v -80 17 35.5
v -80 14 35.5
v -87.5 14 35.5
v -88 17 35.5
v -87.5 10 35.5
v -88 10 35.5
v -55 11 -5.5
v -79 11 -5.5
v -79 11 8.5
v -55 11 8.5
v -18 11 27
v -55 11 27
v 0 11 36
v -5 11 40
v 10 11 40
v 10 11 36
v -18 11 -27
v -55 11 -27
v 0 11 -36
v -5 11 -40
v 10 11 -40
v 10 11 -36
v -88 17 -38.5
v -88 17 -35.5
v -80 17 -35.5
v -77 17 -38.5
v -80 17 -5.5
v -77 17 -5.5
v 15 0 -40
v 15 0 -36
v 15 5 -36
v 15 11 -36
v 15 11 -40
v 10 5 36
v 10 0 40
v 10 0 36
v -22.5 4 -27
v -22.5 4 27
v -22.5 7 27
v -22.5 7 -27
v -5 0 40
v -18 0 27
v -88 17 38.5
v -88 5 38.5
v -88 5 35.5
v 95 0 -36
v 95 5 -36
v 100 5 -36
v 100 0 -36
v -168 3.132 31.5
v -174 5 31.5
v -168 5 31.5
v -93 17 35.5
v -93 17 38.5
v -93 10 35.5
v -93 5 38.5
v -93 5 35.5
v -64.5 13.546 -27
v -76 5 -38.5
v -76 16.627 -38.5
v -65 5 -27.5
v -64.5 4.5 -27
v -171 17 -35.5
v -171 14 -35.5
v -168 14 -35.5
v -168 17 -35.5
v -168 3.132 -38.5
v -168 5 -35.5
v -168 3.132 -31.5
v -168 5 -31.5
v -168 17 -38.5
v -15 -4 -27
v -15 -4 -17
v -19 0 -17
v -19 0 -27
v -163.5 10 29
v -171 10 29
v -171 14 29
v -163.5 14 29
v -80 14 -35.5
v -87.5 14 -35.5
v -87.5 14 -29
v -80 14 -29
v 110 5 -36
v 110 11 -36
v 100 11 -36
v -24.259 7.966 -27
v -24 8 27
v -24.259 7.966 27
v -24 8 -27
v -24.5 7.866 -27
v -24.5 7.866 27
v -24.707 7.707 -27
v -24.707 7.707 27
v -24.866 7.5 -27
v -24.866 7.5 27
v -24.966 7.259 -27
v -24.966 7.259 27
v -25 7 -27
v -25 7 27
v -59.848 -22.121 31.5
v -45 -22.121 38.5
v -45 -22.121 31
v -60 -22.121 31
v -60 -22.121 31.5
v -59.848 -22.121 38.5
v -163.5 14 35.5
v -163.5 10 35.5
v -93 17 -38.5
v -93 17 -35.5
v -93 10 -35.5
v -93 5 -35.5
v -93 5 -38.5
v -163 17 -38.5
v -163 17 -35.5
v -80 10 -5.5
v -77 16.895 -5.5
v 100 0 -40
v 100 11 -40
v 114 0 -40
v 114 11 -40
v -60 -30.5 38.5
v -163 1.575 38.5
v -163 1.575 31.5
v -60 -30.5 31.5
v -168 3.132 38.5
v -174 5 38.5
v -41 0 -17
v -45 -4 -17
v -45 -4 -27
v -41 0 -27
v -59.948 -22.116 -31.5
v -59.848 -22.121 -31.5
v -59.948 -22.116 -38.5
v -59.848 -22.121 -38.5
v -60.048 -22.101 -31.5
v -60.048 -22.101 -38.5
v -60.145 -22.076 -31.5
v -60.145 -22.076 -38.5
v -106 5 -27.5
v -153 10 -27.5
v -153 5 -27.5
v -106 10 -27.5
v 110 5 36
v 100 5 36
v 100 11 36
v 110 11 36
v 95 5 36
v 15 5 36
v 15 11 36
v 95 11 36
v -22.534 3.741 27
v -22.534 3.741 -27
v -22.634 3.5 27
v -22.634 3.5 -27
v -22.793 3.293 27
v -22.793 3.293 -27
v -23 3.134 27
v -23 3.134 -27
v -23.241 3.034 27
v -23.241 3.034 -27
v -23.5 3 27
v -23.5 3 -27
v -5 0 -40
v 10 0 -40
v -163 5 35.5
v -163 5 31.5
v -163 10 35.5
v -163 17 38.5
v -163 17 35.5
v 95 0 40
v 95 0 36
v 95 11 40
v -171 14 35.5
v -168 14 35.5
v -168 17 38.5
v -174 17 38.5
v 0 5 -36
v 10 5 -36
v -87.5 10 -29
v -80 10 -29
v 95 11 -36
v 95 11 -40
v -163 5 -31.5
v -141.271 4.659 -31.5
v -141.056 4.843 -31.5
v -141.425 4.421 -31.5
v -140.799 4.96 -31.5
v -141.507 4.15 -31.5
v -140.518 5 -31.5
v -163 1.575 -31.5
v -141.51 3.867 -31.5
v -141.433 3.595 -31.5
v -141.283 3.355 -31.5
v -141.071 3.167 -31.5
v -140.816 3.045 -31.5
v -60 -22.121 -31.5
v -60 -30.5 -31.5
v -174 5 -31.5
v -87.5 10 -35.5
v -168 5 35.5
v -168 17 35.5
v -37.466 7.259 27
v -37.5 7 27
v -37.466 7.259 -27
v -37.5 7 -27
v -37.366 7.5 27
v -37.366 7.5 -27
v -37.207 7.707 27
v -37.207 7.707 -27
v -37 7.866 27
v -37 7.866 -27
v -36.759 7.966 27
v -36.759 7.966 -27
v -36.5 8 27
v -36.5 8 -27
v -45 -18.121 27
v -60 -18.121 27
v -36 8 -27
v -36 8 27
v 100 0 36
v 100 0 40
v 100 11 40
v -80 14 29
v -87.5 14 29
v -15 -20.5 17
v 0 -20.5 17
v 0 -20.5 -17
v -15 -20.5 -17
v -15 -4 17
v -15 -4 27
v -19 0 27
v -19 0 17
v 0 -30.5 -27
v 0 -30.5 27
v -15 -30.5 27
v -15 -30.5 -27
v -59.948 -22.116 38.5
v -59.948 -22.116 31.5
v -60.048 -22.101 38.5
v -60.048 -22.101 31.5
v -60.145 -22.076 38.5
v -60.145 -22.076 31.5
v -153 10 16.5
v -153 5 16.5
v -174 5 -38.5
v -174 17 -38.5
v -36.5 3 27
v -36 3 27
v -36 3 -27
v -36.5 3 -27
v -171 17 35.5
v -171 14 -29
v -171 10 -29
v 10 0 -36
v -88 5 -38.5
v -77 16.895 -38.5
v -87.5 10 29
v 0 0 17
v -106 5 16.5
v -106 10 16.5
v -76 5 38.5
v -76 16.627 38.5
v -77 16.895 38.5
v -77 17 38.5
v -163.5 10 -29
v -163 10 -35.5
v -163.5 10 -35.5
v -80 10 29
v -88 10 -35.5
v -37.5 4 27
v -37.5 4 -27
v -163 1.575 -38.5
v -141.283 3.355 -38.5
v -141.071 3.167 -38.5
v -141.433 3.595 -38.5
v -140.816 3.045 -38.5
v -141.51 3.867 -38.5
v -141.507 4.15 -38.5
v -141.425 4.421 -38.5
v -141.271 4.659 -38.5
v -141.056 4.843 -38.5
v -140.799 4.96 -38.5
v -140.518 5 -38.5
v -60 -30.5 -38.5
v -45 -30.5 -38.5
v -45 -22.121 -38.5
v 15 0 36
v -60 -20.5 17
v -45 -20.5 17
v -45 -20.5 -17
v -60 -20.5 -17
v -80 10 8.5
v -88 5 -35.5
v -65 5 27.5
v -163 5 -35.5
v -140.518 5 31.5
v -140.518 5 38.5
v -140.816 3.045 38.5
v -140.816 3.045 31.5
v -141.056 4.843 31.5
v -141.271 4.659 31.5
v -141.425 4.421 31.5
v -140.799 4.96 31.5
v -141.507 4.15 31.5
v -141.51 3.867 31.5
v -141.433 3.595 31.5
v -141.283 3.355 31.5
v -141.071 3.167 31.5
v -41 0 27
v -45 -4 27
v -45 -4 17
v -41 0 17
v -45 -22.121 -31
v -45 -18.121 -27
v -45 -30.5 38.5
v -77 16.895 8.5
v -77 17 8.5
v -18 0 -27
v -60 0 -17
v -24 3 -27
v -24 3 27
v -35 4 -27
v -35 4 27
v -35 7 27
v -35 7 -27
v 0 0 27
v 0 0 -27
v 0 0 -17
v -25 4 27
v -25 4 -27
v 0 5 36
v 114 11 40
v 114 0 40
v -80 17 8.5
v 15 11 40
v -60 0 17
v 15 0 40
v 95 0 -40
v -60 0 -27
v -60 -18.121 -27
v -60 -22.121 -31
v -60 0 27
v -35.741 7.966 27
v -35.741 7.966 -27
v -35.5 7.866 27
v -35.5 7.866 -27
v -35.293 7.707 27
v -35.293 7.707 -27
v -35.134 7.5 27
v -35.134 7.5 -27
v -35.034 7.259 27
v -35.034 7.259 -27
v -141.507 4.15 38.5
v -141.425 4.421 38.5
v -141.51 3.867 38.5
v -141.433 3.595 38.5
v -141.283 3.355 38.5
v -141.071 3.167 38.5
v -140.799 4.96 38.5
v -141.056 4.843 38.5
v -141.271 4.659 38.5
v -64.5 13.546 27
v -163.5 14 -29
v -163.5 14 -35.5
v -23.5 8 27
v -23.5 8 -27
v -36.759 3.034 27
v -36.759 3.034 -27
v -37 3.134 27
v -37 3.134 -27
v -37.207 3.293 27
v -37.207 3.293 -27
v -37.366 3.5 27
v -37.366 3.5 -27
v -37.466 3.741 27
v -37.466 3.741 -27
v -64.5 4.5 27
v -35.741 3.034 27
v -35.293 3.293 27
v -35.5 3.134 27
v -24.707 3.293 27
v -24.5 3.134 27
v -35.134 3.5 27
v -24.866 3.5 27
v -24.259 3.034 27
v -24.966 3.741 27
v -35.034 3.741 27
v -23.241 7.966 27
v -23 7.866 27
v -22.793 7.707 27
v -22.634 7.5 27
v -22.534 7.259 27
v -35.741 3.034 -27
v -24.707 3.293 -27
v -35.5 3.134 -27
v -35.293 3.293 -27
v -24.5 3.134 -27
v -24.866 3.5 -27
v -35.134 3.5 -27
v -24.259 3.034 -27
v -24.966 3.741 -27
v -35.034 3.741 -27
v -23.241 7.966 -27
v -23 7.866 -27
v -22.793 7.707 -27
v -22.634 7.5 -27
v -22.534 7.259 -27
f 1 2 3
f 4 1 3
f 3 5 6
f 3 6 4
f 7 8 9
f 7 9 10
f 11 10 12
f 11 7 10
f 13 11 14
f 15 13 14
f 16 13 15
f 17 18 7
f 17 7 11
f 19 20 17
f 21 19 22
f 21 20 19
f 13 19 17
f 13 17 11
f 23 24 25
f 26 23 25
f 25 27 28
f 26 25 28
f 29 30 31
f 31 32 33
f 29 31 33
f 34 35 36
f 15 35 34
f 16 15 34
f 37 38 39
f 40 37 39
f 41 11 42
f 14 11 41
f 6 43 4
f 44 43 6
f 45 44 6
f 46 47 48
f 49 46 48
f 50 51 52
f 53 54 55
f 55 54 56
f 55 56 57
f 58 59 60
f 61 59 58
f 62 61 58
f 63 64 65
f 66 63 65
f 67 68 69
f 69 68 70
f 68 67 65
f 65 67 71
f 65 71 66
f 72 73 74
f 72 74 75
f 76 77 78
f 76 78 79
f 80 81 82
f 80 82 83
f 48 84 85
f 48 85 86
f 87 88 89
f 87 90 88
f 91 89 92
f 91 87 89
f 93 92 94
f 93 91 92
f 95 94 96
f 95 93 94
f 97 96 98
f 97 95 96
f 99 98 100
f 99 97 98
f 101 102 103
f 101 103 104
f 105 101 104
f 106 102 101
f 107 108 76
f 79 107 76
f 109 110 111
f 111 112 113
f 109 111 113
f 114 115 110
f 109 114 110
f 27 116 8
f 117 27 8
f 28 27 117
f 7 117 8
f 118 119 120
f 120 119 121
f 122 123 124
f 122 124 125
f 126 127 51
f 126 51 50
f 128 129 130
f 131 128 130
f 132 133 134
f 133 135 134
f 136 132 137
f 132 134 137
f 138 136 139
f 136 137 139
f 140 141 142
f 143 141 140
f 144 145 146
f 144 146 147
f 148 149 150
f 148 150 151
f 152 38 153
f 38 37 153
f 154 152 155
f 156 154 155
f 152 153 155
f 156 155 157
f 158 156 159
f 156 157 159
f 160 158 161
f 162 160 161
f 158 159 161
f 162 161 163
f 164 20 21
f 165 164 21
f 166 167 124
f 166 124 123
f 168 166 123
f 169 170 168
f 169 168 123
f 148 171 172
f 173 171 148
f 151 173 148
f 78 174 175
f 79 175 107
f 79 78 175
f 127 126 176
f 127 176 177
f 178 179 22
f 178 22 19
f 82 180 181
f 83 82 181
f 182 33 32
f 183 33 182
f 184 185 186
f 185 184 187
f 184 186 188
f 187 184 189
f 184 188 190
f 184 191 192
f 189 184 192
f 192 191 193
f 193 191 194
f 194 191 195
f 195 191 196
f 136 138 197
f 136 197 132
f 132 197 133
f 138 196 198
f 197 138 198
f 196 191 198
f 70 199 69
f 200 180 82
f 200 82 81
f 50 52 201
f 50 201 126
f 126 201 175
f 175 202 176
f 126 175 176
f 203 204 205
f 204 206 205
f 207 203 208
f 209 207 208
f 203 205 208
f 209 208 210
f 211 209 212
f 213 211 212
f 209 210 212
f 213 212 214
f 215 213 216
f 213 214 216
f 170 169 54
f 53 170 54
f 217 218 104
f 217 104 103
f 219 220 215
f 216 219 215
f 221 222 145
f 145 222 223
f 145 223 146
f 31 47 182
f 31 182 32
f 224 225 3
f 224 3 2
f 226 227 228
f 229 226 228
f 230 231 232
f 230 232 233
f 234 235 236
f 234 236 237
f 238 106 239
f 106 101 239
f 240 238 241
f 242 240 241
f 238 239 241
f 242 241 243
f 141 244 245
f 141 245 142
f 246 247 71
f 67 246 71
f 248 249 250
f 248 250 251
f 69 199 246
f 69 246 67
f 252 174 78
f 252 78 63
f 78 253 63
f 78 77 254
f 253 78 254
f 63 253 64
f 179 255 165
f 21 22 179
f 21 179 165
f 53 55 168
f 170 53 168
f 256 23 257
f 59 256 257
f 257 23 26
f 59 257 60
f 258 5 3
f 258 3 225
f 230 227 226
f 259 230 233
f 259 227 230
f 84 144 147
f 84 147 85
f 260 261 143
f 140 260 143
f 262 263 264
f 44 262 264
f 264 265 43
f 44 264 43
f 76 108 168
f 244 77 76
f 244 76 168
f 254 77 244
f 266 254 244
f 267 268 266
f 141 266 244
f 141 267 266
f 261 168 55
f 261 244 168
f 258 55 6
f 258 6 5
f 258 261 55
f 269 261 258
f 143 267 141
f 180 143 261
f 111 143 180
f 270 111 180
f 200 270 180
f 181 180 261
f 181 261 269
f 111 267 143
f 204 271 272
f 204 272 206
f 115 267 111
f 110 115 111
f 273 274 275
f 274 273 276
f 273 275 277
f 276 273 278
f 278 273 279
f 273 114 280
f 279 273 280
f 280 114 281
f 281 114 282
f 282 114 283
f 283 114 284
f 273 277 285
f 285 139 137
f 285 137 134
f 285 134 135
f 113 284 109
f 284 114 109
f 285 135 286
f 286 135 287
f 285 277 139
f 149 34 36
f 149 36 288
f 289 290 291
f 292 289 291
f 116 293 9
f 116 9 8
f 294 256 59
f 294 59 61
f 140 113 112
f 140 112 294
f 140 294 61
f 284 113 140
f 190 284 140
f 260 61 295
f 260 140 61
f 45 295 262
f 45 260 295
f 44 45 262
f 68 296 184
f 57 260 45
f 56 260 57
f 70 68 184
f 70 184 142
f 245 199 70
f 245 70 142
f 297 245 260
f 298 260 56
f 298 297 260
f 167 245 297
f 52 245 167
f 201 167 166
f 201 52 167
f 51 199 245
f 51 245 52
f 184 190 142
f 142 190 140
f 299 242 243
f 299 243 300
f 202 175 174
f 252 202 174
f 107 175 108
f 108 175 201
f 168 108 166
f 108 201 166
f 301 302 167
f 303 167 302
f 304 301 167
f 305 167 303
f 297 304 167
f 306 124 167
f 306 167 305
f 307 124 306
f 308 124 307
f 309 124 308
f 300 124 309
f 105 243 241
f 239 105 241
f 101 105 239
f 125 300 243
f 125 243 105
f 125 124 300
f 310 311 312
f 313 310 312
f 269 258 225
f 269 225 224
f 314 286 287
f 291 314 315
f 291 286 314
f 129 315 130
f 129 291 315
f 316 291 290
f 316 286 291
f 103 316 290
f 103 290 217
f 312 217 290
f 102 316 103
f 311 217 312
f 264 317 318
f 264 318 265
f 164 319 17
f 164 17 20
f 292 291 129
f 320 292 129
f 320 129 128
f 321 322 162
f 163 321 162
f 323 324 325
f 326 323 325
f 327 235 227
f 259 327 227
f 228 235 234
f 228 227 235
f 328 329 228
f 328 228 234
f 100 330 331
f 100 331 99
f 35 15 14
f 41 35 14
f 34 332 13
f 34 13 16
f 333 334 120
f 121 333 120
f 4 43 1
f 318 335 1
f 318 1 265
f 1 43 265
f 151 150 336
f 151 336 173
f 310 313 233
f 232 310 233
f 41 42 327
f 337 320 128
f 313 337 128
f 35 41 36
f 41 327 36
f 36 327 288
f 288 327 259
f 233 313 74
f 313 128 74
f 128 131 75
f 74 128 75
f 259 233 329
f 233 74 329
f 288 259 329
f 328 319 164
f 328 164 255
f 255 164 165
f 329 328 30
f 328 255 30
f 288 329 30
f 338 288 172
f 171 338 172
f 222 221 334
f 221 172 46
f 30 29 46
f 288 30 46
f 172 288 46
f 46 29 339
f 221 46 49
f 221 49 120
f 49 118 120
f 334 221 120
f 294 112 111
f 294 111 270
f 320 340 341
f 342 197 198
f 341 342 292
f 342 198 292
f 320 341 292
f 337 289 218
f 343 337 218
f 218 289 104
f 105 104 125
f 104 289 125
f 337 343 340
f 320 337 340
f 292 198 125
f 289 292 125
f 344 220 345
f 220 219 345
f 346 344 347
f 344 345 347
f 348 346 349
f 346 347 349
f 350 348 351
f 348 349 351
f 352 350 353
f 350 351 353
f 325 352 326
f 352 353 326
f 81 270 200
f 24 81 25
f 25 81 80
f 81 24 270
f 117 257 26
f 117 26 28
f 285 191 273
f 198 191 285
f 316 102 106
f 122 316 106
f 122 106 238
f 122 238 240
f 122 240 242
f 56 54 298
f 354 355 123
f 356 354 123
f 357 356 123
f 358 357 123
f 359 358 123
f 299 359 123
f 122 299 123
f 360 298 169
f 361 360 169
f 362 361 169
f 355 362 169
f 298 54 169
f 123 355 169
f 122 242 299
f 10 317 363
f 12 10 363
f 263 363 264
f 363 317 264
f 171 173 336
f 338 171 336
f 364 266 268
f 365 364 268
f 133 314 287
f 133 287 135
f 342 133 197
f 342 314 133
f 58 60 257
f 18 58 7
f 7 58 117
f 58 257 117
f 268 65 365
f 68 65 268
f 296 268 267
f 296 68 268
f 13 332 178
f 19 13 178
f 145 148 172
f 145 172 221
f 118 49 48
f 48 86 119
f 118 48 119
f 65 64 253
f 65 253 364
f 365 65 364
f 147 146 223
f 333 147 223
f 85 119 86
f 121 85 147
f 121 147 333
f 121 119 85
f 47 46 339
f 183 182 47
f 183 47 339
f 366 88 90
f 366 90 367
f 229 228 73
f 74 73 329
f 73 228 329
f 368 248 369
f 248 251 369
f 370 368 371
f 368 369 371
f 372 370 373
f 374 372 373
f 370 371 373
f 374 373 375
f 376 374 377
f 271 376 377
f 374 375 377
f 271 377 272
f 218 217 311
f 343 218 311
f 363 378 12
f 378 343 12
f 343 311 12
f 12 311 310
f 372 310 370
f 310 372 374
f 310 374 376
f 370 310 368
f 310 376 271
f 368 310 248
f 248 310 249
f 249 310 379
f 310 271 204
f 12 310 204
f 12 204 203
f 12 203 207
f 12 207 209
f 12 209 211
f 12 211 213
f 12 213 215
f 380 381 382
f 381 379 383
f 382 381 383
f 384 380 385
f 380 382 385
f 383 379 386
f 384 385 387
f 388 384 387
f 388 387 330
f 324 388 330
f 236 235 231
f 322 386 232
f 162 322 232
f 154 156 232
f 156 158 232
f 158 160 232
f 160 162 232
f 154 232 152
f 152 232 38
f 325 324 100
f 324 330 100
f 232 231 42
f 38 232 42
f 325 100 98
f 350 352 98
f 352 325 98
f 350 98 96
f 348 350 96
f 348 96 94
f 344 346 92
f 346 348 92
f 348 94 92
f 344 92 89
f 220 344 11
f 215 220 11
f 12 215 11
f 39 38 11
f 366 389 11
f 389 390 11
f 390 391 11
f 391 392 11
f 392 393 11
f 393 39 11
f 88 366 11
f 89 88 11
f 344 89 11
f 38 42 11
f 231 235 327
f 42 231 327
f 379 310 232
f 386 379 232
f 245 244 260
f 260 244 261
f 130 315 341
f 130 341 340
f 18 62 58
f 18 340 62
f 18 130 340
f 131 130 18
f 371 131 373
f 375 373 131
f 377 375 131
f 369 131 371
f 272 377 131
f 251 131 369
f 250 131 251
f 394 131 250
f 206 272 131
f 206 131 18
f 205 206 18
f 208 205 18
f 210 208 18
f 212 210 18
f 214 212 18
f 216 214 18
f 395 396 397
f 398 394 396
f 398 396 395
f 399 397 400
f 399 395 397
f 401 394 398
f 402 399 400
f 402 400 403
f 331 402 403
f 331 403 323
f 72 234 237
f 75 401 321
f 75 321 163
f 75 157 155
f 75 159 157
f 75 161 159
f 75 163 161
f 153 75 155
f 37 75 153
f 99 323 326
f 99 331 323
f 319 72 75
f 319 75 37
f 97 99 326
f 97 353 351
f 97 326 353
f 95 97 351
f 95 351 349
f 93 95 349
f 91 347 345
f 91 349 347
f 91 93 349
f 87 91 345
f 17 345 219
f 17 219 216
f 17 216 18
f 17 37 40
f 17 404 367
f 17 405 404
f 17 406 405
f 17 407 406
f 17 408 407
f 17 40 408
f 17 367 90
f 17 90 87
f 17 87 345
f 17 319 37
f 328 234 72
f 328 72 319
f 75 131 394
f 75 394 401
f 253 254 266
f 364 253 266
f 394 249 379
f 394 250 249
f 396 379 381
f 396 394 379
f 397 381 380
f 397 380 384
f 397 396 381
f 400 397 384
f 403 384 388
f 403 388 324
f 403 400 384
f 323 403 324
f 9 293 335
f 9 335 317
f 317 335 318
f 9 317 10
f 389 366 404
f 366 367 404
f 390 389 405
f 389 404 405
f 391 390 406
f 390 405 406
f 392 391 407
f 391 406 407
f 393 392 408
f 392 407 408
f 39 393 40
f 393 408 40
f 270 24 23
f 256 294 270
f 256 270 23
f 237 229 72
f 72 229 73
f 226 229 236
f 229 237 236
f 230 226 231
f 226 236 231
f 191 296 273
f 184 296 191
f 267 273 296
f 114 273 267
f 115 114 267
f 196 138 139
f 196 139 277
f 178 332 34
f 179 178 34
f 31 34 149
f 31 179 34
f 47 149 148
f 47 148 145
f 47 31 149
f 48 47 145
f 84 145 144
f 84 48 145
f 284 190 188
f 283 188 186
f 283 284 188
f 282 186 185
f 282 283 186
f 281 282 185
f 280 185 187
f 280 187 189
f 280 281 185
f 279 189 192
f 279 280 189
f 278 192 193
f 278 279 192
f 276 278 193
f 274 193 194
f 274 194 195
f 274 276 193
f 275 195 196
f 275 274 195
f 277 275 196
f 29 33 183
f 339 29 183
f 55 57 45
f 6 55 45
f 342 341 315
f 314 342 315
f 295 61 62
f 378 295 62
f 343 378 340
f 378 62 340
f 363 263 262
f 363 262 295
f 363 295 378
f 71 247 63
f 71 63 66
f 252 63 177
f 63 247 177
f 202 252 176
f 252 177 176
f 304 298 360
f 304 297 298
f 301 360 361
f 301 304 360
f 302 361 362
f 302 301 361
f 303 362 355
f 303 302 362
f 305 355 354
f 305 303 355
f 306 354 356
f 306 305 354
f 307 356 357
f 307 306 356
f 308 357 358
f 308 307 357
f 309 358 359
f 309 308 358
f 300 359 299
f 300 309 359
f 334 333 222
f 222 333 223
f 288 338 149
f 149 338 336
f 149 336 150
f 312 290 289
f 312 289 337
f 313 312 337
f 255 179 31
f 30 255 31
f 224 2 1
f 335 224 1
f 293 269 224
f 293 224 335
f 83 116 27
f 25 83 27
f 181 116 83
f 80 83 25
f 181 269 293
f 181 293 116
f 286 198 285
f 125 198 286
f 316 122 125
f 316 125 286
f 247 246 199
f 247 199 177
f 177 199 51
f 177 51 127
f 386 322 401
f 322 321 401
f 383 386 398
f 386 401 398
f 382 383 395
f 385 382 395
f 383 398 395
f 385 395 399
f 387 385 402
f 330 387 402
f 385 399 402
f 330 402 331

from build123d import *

# Parameters (mm, degrees)
SKETCH2_W            = 54
SKETCH2_H            = 41.5
SKETCH2_W_2          = 34
SKETCH2_H_2          = 20.5
BOSS_EXTRUDE1_DEPTH  = 80
CUT_EXTRUDE2_REACH   = 103.224
SKETCH4_W            = 30
SKETCH4_H            = 30.5
SKETCH4_W_2          = 20
SKETCH7_W            = 91
SKETCH7_H            = 71
BOSS_EXTRUDE2_DEPTH  = 5
SKETCH8_W            = 47
SKETCH8_H            = 44
CUT_EXTRUDE3_DEPTH   = 6
SKETCH10_W           = 97
SKETCH10_H           = 77
BOSS_EXTRUDE3_DEPTH  = 12
SKETCH11_W           = 7.5
SKETCH11_H           = 6.5
BOSS_EXTRUDE4_DEPTH  = 4
SKETCH12_W           = 3
SKETCH12_H           = 14
CUT_EXTRUDE5_DEPTH   = 6
SKETCH13_W           = 2.5
SKETCH13_H           = 5
CUT_EXTRUDE6_DEPTH   = 54
BOSS_EXTRUDE5_REACH  = 194.705
CUT_EXTRUDE8_REACH   = 186.43
SKETCH18_W           = 114
SKETCH18_H           = 63
CHAMFER2_SIZE        = 5
FILLET1_R            = 1
CHAMFER3_SIZE        = 4
CHAMFER4_SIZE        = 12.5
FILLET2_R            = 1
CHAMFER5_SIZE        = 1
FILLET2_OF_MIRROR1_R = 1
BOSS_EXTRUDE6_START  = -5
SKETCH19_W           = 110
SKETCH19_H           = 72
BOSS_EXTRUDE6_DEPTH  = 5
BOSS_EXTRUDE7_START  = -5
SKETCH21_W           = 118
SKETCH21_H           = 80
BOSS_EXTRUDE7_DEPTH  = 11
CHAMFER7_SIZE        = 14
CUT_EXTRUDE9_REACH   = 185.298
SKETCH22_W           = 5
SKETCH22_H           = 4
CUT_EXTRUDE10_START  = -12
SKETCH23_W           = 5
SKETCH23_H           = 3
CUT_EXTRUDE10_DEPTH  = 12
CUT_EXTRUDE11_REACH  = 184.034
SKETCH24_W           = 5
SKETCH24_H           = 77
CHAMFER8_SIZE        = 22
CHAMFER8_SIZE2       = 5.894882233


# Some blends are built 0.0001 mm under size
with BuildPart() as part:
    # Sketch2 → Boss-Extrude1 (new body)
    with BuildSketch(Plane(origin=(0, 0, 0), x_dir=(0, 0, -1), z_dir=(1, 0, 0))):
        with Locations((0, -9.75)):
            Rectangle(SKETCH2_W, SKETCH2_H)
        with Locations((0, -10.25)):
            Rectangle(SKETCH2_W_2, SKETCH2_H_2, mode=Mode.SUBTRACT)
    extrude(amount=-BOSS_EXTRUDE1_DEPTH)

    # Cut-Extrude2: up to this face of the body (flat: up to its plane)
    cut_extrude2_end = Plane(part.part.faces().sort_by_distance((-40, -9.75, -27))[0])
    # Sketch4 → Cut-Extrude2 (cut, up to the picked face)
    with BuildSketch(Plane.XY.offset(27), mode=Mode.PRIVATE) as cut_extrude2_sk1:
        with Locations((-30, -15.25)):
            Rectangle(SKETCH4_W, SKETCH4_H)
    cut_extrude2_tool1 = split(extrude(cut_extrude2_sk1.sketch, amount=-CUT_EXTRUDE2_REACH, mode=Mode.PRIVATE), bisect_by=cut_extrude2_end, keep=Keep.BOTH, mode=Mode.PRIVATE)
    # Sketch4 → Cut-Extrude2 (cut, up to the picked face)
    with BuildSketch(Plane.XY.offset(27), mode=Mode.PRIVATE) as cut_extrude2_sk2:
        with Locations((-70, -15.25)):
            Rectangle(SKETCH4_W_2, SKETCH4_H)
    cut_extrude2_tool2 = split(extrude(cut_extrude2_sk2.sketch, amount=-CUT_EXTRUDE2_REACH, mode=Mode.PRIVATE), bisect_by=cut_extrude2_end, keep=Keep.BOTH, mode=Mode.PRIVATE)
    add(cut_extrude2_tool1.solids().sort_by(Axis((-30, -15.25, 27), (0, 0, -1)))[0], mode=Mode.SUBTRACT)
    add(cut_extrude2_tool2.solids().sort_by(Axis((-70, -15.25, 27), (0, 0, -1)))[0], mode=Mode.SUBTRACT)

    # Sketch7 → Boss-Extrude2 (add)
    with BuildSketch(Plane(origin=(0, 5, 0), x_dir=(1, 0, 0), z_dir=(0, 1, 0))):
        with Locations((-125.5, 0)):
            Rectangle(SKETCH7_W, SKETCH7_H)
    extrude(amount=BOSS_EXTRUDE2_DEPTH)

    # Sketch8 → Cut-Extrude3 (cut)
    with BuildSketch(Plane(origin=(0, 11, 0), x_dir=(1, 0, 0), z_dir=(0, 1, 0))):
        with Locations((-129.5, 5.5)):
            Rectangle(SKETCH8_W, SKETCH8_H)
    extrude(amount=-CUT_EXTRUDE3_DEPTH, mode=Mode.SUBTRACT)

    # Sketch10 → Boss-Extrude3 (add)
    with BuildSketch(Plane.XZ.offset(-5)):
        with Locations((-125.5, 0)):
            Rectangle(SKETCH10_W, SKETCH10_H)
        Polygon((-80, 27), (-80, 35.5), (-171, 35.5), (-171, -35.5), (-80, -35.5), (-80, -27), align=None, mode=Mode.SUBTRACT)
    extrude(amount=-BOSS_EXTRUDE3_DEPTH)

    # Sketch11 → Boss-Extrude4 (add)
    with BuildSketch(Plane(origin=(0, 10, 0), x_dir=(1, 0, 0), z_dir=(0, 1, 0))):
        with Locations((-167.25, -32.25)):
            Rectangle(SKETCH11_W, SKETCH11_H)
        with Locations((-83.75, -32.25)):
            Rectangle(SKETCH11_W, SKETCH11_H)
        with Locations((-83.75, 32.25)):
            Rectangle(SKETCH11_W, SKETCH11_H)
        with Locations((-167.25, 32.25)):
            Rectangle(SKETCH11_W, SKETCH11_H)
    extrude(amount=BOSS_EXTRUDE4_DEPTH)

    # Sketch12 → Cut-Extrude5 (cut)
    with BuildSketch(Plane(origin=(0, 17, 0), x_dir=(1, 0, 0), z_dir=(0, 1, 0))):
        with Locations((-78.5, -1.5)):
            Rectangle(SKETCH12_W, SKETCH12_H)
    extrude(amount=-CUT_EXTRUDE5_DEPTH, mode=Mode.SUBTRACT)

    # Sketch13 → Cut-Extrude6 (cut)
    with BuildSketch(Plane.XY.offset(27)):
        with Locations((-23.75, 5.5)):
            Rectangle(SKETCH13_W, SKETCH13_H)
    cut_extrude6 = extrude(amount=-CUT_EXTRUDE6_DEPTH, mode=Mode.SUBTRACT)

    # Boss-Extrude5: up to this face of the body (flat: up to its plane)
    boss_extrude5_end = Plane(part.part.faces().sort_by_distance((-125.5, 11, -38.5))[0])
    # Sketch15 → Boss-Extrude5 (add, up to the picked face)
    with BuildSketch(Plane.XY.offset(38.5), mode=Mode.PRIVATE) as boss_extrude5_sk1:
        Polygon((-174, 5), (-60, -30.5), (-45, -30.5), (-45, -22.121084957), (-60, -22.121084957), (-147.093061552, 5), align=None)
    boss_extrude5_tool1 = split(extrude(boss_extrude5_sk1.sketch, amount=-BOSS_EXTRUDE5_REACH, mode=Mode.PRIVATE), bisect_by=boss_extrude5_end, keep=Keep.BOTH, mode=Mode.PRIVATE)
    add(boss_extrude5_tool1.solids().sort_by(Axis((-103.034337, -12.768903, 38.5), (0, 0, -1)))[0])

    # Cut-Extrude8: up to this face of the body (flat: up to its plane)
    cut_extrude8_end = Plane(part.part.faces().sort_by_distance((-105.982216644, 5, 2.901755115))[0])
    # Sketch18 → Cut-Extrude8 (cut, up to the picked face)
    with BuildSketch(Plane.XZ.offset(30.5), mode=Mode.PRIVATE) as cut_extrude8_sk1:
        with Locations((-117, 0)):
            Rectangle(SKETCH18_W, SKETCH18_H)
    cut_extrude8_tool1 = split(extrude(cut_extrude8_sk1.sketch, amount=-CUT_EXTRUDE8_REACH, mode=Mode.PRIVATE), bisect_by=cut_extrude8_end, keep=Keep.BOTH, mode=Mode.PRIVATE)
    add(cut_extrude8_tool1.solids().sort_by(Axis((-117, -30.5, 0), (0, 1, 0)))[0], mode=Mode.SUBTRACT)

    # Chamfer2
    chamfer2_edges = [part.edges().sort_by_distance(p)[0] for p in [
        (-60, 5, 0),
    ]]
    chamfer(chamfer2_edges, length=CHAMFER2_SIZE - 0.0001)  # a hair under: the kernel refuses the full size

    # Fillet1
    fillet1_edges = [part.edges().sort_by_distance(p)[0] for p in [
        (-60, -22.121084957, -35),
        (-147.093061552, 5, -35),
        (-147.093061552, 5, 35),
        (-60, -22.121084957, 35),
    ]]
    fillet(fillet1_edges, radius=FILLET1_R)

    # Chamfer3
    chamfer3_edges = [part.edges().sort_by_distance(p)[0] for p in [
        (-52.5, -22.121084957, 27),
        (-52.5, -22.121084957, -27),
        (-45, 0, 22),
        (-45, 0, -22),
        (-15, 0, 22),
        (-15, 0, -22),
    ]]
    chamfer(chamfer3_edges, length=CHAMFER3_SIZE)

    # Chamfer4
    # the kernel refuses this chamfer: 12.5 mm, written as the material it adds along each edge
    with BuildSketch(Plane(origin=(-77, 11, 27), x_dir=(-0.027495876610586587, 0, 0.9996219169112966), z_dir=(0, -1, 0))) as chamfer4_piece_1_section:
        Polygon((CHAMFER4_SIZE * 0.999621916911, -CHAMFER4_SIZE * 0.0274958766106), (-CHAMFER4_SIZE * 0.0274958766106, -CHAMFER4_SIZE * 0.999621916911), (0, 0), align=None)
    chamfer4_piece_1 = extrude(amount=6, mode=Mode.PRIVATE)
    chamfer4_piece_1 = split(chamfer4_piece_1, bisect_by=Plane(origin=(-68.359552988, 8.359652988, 28.292902516), z_dir=(0.7071067811865472, 0.7071067811865478, 0)), keep=Keep.TOP, mode=Mode.PRIVATE)
    add(chamfer4_piece_1)
    with BuildSketch(Plane(origin=(-77, 11, 27), x_dir=(-0.027495876610586587, 0, 0.9996219169112966), z_dir=(0, -1, 0))) as chamfer4_piece_2_section:
        Polygon((CHAMFER4_SIZE * 0.999621916911, -CHAMFER4_SIZE * 0.0274958766106), (-CHAMFER4_SIZE * 0.0274958766106, -CHAMFER4_SIZE * 0.999621916911), (0, 0), align=None)
    chamfer4_piece_2 = extrude(amount=38.14603735, mode=Mode.PRIVATE)
    chamfer4_piece_2 = split(chamfer4_piece_2, bisect_by=Plane(origin=(-64.503738194, 5, 26.714487269), z_dir=(0, -1, 0)), keep=Keep.TOP, mode=Mode.PRIVATE)
    chamfer4_piece_2 = split(chamfer4_piece_2, bisect_by=Plane(origin=(-64.627778646, 4.627878646, 26.714487269), z_dir=(0.7071067811865472, 0.7071067811865478, 0)), keep=Keep.TOP, mode=Mode.PRIVATE)
    add(chamfer4_piece_2)
    with BuildSketch(Plane(origin=(-77, 11, 27), x_dir=(-0.027495876610586587, 0, 0.9996219169112966), z_dir=(0, -1, 0))) as chamfer4_piece_3_section:
        Polygon((CHAMFER4_SIZE * 0.999621916911, -CHAMFER4_SIZE * 0.0274958766106), (-CHAMFER4_SIZE * 0.0274958766106, -CHAMFER4_SIZE * 0.999621916911), (0, 0), align=None)
    chamfer4_piece_3 = extrude(amount=6, mode=Mode.PRIVATE)
    chamfer4_piece_3 = split(chamfer4_piece_3, bisect_by=Plane(origin=(-73.477032912, 7.846772168, 38.5), z_dir=(0, 0, -1)), keep=Keep.TOP, mode=Mode.PRIVATE)
    chamfer4_piece_3 = split(chamfer4_piece_3, bisect_by=Plane(origin=(-70.66185254, 10.66195254, 31.346666283), z_dir=(-0.7071067811865472, -0.7071067811865478, 0)), keep=Keep.TOP, mode=Mode.PRIVATE)
    add(chamfer4_piece_3)
    with BuildSketch(Plane(origin=(-77, -27.14603735, -27), x_dir=(-0.027495876610586587, 0, -0.9996219169112966), z_dir=(0, 1, 0))) as chamfer4_piece_4_section:
        Polygon((CHAMFER4_SIZE * 0.999621916911, -CHAMFER4_SIZE * 0.0274958766106), (-CHAMFER4_SIZE * 0.0274958766106, -CHAMFER4_SIZE * 0.999621916911), (0, 0), align=None)
    chamfer4_piece_4 = extrude(amount=38.14603735, mode=Mode.PRIVATE)
    chamfer4_piece_4 = split(chamfer4_piece_4, bisect_by=Plane(origin=(-64.627778646, 4.627878646, -26.714487269), z_dir=(0.7071067811865472, 0.7071067811865478, 0)), keep=Keep.TOP, mode=Mode.PRIVATE)
    chamfer4_piece_4 = split(chamfer4_piece_4, bisect_by=Plane(origin=(-64.503738194, 5, -26.714487269), z_dir=(0, -1, 0)), keep=Keep.TOP, mode=Mode.PRIVATE)
    add(chamfer4_piece_4)
    with BuildSketch(Plane(origin=(-77, 5, -27), x_dir=(-0.027495876610586587, 0, -0.9996219169112966), z_dir=(0, 1, 0))) as chamfer4_piece_5_section:
        Polygon((CHAMFER4_SIZE * 0.999621916911, -CHAMFER4_SIZE * 0.0274958766106), (-CHAMFER4_SIZE * 0.0274958766106, -CHAMFER4_SIZE * 0.999621916911), (0, 0), align=None)
    chamfer4_piece_5 = extrude(amount=6, mode=Mode.PRIVATE)
    chamfer4_piece_5 = split(chamfer4_piece_5, bisect_by=Plane(origin=(-73.477032912, 7.846772168, -38.5), z_dir=(0, 0, 1)), keep=Keep.TOP, mode=Mode.PRIVATE)
    chamfer4_piece_5 = split(chamfer4_piece_5, bisect_by=Plane(origin=(-70.66185254, 10.66195254, -31.346666283), z_dir=(-0.7071067811865472, -0.7071067811865478, 0)), keep=Keep.TOP, mode=Mode.PRIVATE)
    add(chamfer4_piece_5)
    with BuildSketch(Plane(origin=(-77, 5, -27), x_dir=(-0.027495876610586587, 0, -0.9996219169112966), z_dir=(0, 1, 0))) as chamfer4_piece_6_section:
        Polygon((CHAMFER4_SIZE * 0.999621916911, -CHAMFER4_SIZE * 0.0274958766106), (-CHAMFER4_SIZE * 0.0274958766106, -CHAMFER4_SIZE * 0.999621916911), (0, 0), align=None)
    chamfer4_piece_6 = extrude(amount=6, mode=Mode.PRIVATE)
    chamfer4_piece_6 = split(chamfer4_piece_6, bisect_by=Plane(origin=(-68.359552988, 8.359652988, -28.292902516), z_dir=(0.7071067811865472, 0.7071067811865478, 0)), keep=Keep.TOP, mode=Mode.PRIVATE)
    add(chamfer4_piece_6)

    # Fillet2
    fillet2_edges = [part.edges().sort_by_distance(p)[0] for p in [
        (-22.5, 3, 0),
        (-22.5, 8, 0),
        (-25, 8, 0),
        (-25, 3, 0),
    ]]
    fillet(fillet2_edges, radius=FILLET2_R)

    # Chamfer5
    chamfer5_edges = [part.edges().sort_by_distance(p)[0] for p in [
        (-80, 11, 1.5),
    ]]
    chamfer(chamfer5_edges, length=CHAMFER5_SIZE - 0.0001)  # a hair under: the kernel refuses the full size

    # Mirror1: Cut-Extrude6 across plane
    add(cut_extrude6.mirror(Plane(origin=(-30, 0, 0), x_dir=(0, 0, 1), z_dir=(1, 0, 0))), mode=Mode.SUBTRACT)

    # Fillet2 of Mirror1
    fillet2_of_mirror1_edges = [part.edges().sort_by_distance(p)[0] for p in [
        (-37.5, 3, 0),
        (-37.5, 8, 0),
        (-35, 8, 0),
        (-35, 3, 0),
    ]]
    fillet(fillet2_of_mirror1_edges, radius=FILLET2_OF_MIRROR1_R)

    # Sketch19 → Boss-Extrude6 (add)
    with BuildSketch(Plane(origin=(0, 5, 0), x_dir=(1, 0, 0), z_dir=(0, 1, 0)).offset(BOSS_EXTRUDE6_START)):
        with Locations((55, 0)):
            Rectangle(SKETCH19_W, SKETCH19_H)
    extrude(amount=BOSS_EXTRUDE6_DEPTH)

    # Sketch21 → Boss-Extrude7 (add)
    with BuildSketch(Plane(origin=(0, 5, 0), x_dir=(1, 0, 0), z_dir=(0, 1, 0)).offset(BOSS_EXTRUDE7_START)):
        with Locations((55, 0)):
            Rectangle(SKETCH21_W, SKETCH21_H)
        Polygon((0, 36), (0, 27), (0, -27), (0, -36), (110, -36), (110, 36), align=None, mode=Mode.SUBTRACT)
    extrude(amount=BOSS_EXTRUDE7_DEPTH)

    # Chamfer7
    # the kernel refuses this chamfer: 14 mm, written as the material it adds along each edge
    with BuildSketch(Plane(origin=(-4, 0, -27), x_dir=(-0.9996219169112968, 0, 0.02749587661058612), z_dir=(0, 1, 0))) as chamfer7_piece_1_section:
        Polygon((CHAMFER7_SIZE * 0.999621916911, -CHAMFER7_SIZE * 0.0274958766106), (-CHAMFER7_SIZE * 0.0274958766106, -CHAMFER7_SIZE * 0.999621916911), (0, 0), align=None)
    chamfer7_piece_1 = extrude(amount=11, mode=Mode.PRIVATE)
    chamfer7_piece_1 = split(chamfer7_piece_1, bisect_by=Plane(origin=(-16, 5.5, -40), z_dir=(0, 0, 1)), keep=Keep.TOP, mode=Mode.PRIVATE)
    add(chamfer7_piece_1)
    with BuildSketch(Plane(origin=(-4, 11, 27), x_dir=(-0.9996219169112968, 0, -0.02749587661058612), z_dir=(0, -1, 0))) as chamfer7_piece_2_section:
        Polygon((CHAMFER7_SIZE * 0.999621916911, -CHAMFER7_SIZE * 0.0274958766106), (-CHAMFER7_SIZE * 0.0274958766106, -CHAMFER7_SIZE * 0.999621916911), (0, 0), align=None)
    chamfer7_piece_2 = extrude(amount=11, mode=Mode.PRIVATE)
    chamfer7_piece_2 = split(chamfer7_piece_2, bisect_by=Plane(origin=(-16, 5.5, 40), z_dir=(0, 0, -1)), keep=Keep.TOP, mode=Mode.PRIVATE)
    add(chamfer7_piece_2)

    # Cut-Extrude9: up to this face of the body (flat: up to its plane)
    cut_extrude9_end = Plane(part.part.faces().sort_by_distance((37.275205199, 0, 0))[0])
    # Sketch22 → Cut-Extrude9 (cut, up to the picked face)
    with BuildSketch(Plane(origin=(0, 11, 0), x_dir=(1, 0, 0), z_dir=(0, 1, 0)), mode=Mode.PRIVATE) as cut_extrude9_sk1:
        with Locations((97.5, 38)):
            Rectangle(SKETCH22_W, SKETCH22_H)
    cut_extrude9_tool1 = split(extrude(cut_extrude9_sk1.sketch, amount=-CUT_EXTRUDE9_REACH, mode=Mode.PRIVATE), bisect_by=cut_extrude9_end, keep=Keep.BOTH, mode=Mode.PRIVATE)
    # Sketch22 → Cut-Extrude9 (cut, up to the picked face)
    with BuildSketch(Plane(origin=(0, 11, 0), x_dir=(1, 0, 0), z_dir=(0, 1, 0)), mode=Mode.PRIVATE) as cut_extrude9_sk2:
        with Locations((97.5, -38)):
            Rectangle(SKETCH22_W, SKETCH22_H)
    cut_extrude9_tool2 = split(extrude(cut_extrude9_sk2.sketch, amount=-CUT_EXTRUDE9_REACH, mode=Mode.PRIVATE), bisect_by=cut_extrude9_end, keep=Keep.BOTH, mode=Mode.PRIVATE)
    # Sketch22 → Cut-Extrude9 (cut, up to the picked face)
    with BuildSketch(Plane(origin=(0, 11, 0), x_dir=(1, 0, 0), z_dir=(0, 1, 0)), mode=Mode.PRIVATE) as cut_extrude9_sk3:
        with Locations((12.5, -38)):
            Rectangle(SKETCH22_W, SKETCH22_H)
    cut_extrude9_tool3 = split(extrude(cut_extrude9_sk3.sketch, amount=-CUT_EXTRUDE9_REACH, mode=Mode.PRIVATE), bisect_by=cut_extrude9_end, keep=Keep.BOTH, mode=Mode.PRIVATE)
    # Sketch22 → Cut-Extrude9 (cut, up to the picked face)
    with BuildSketch(Plane(origin=(0, 11, 0), x_dir=(1, 0, 0), z_dir=(0, 1, 0)), mode=Mode.PRIVATE) as cut_extrude9_sk4:
        with Locations((12.5, 38)):
            Rectangle(SKETCH22_W, SKETCH22_H)
    cut_extrude9_tool4 = split(extrude(cut_extrude9_sk4.sketch, amount=-CUT_EXTRUDE9_REACH, mode=Mode.PRIVATE), bisect_by=cut_extrude9_end, keep=Keep.BOTH, mode=Mode.PRIVATE)
    add(cut_extrude9_tool1.solids().sort_by(Axis((97.5, 11, -38), (0, -1, 0)))[0], mode=Mode.SUBTRACT)
    add(cut_extrude9_tool2.solids().sort_by(Axis((97.5, 11, 38), (0, -1, 0)))[0], mode=Mode.SUBTRACT)
    add(cut_extrude9_tool3.solids().sort_by(Axis((12.5, 11, 38), (0, -1, 0)))[0], mode=Mode.SUBTRACT)
    add(cut_extrude9_tool4.solids().sort_by(Axis((12.5, 11, -38), (0, -1, 0)))[0], mode=Mode.SUBTRACT)

    # Sketch23 → Cut-Extrude10 (cut)
    with BuildSketch(Plane(origin=(0, 17, 0), x_dir=(1, 0, 0), z_dir=(0, 1, 0)).offset(CUT_EXTRUDE10_START)):
        with Locations((-165.5, 37)):
            Rectangle(SKETCH23_W, SKETCH23_H)
        with Locations((-90.5, 37)):
            Rectangle(SKETCH23_W, SKETCH23_H)
        with Locations((-90.5, -37)):
            Rectangle(SKETCH23_W, SKETCH23_H)
        with Locations((-165.5, -37)):
            Rectangle(SKETCH23_W, SKETCH23_H)
    extrude(amount=CUT_EXTRUDE10_DEPTH, mode=Mode.SUBTRACT)

    # Cut-Extrude11: up to this plane
    cut_extrude11_end = Plane(origin=(-174, 5, -172.29555299), z_dir=(-0.29732108004363994, -0.9547775528161958, 0))
    # Sketch24 → Cut-Extrude11 (cut, up to the surface)
    with BuildSketch(Plane.XZ.offset(-5), mode=Mode.PRIVATE) as cut_extrude11_sk1:
        with Locations((-165.5, 0)):
            Rectangle(SKETCH24_W, SKETCH24_H)
    cut_extrude11_tool1 = split(extrude(cut_extrude11_sk1.sketch, amount=CUT_EXTRUDE11_REACH, mode=Mode.PRIVATE), bisect_by=cut_extrude11_end, keep=Keep.BOTH, mode=Mode.PRIVATE)
    add(cut_extrude11_tool1.solids().sort_by_distance((-165.5, 5, 0))[0], mode=Mode.SUBTRACT)

    # Chamfer8
    chamfer8_edges = [part.edges().sort_by_distance(p)[0] for p in [
        (-77, 11, -22),
        (-77, 11, 23.5),
    ]]
    chamfer8_side = [part.faces().sort_by_distance(p)[0] for p in [
        (-37.089758736, 11, 0.008898276),
    ]]
    chamfer(chamfer8_edges, length=CHAMFER8_SIZE, length2=CHAMFER8_SIZE2, reference=chamfer8_side[0])


solid = part.part
